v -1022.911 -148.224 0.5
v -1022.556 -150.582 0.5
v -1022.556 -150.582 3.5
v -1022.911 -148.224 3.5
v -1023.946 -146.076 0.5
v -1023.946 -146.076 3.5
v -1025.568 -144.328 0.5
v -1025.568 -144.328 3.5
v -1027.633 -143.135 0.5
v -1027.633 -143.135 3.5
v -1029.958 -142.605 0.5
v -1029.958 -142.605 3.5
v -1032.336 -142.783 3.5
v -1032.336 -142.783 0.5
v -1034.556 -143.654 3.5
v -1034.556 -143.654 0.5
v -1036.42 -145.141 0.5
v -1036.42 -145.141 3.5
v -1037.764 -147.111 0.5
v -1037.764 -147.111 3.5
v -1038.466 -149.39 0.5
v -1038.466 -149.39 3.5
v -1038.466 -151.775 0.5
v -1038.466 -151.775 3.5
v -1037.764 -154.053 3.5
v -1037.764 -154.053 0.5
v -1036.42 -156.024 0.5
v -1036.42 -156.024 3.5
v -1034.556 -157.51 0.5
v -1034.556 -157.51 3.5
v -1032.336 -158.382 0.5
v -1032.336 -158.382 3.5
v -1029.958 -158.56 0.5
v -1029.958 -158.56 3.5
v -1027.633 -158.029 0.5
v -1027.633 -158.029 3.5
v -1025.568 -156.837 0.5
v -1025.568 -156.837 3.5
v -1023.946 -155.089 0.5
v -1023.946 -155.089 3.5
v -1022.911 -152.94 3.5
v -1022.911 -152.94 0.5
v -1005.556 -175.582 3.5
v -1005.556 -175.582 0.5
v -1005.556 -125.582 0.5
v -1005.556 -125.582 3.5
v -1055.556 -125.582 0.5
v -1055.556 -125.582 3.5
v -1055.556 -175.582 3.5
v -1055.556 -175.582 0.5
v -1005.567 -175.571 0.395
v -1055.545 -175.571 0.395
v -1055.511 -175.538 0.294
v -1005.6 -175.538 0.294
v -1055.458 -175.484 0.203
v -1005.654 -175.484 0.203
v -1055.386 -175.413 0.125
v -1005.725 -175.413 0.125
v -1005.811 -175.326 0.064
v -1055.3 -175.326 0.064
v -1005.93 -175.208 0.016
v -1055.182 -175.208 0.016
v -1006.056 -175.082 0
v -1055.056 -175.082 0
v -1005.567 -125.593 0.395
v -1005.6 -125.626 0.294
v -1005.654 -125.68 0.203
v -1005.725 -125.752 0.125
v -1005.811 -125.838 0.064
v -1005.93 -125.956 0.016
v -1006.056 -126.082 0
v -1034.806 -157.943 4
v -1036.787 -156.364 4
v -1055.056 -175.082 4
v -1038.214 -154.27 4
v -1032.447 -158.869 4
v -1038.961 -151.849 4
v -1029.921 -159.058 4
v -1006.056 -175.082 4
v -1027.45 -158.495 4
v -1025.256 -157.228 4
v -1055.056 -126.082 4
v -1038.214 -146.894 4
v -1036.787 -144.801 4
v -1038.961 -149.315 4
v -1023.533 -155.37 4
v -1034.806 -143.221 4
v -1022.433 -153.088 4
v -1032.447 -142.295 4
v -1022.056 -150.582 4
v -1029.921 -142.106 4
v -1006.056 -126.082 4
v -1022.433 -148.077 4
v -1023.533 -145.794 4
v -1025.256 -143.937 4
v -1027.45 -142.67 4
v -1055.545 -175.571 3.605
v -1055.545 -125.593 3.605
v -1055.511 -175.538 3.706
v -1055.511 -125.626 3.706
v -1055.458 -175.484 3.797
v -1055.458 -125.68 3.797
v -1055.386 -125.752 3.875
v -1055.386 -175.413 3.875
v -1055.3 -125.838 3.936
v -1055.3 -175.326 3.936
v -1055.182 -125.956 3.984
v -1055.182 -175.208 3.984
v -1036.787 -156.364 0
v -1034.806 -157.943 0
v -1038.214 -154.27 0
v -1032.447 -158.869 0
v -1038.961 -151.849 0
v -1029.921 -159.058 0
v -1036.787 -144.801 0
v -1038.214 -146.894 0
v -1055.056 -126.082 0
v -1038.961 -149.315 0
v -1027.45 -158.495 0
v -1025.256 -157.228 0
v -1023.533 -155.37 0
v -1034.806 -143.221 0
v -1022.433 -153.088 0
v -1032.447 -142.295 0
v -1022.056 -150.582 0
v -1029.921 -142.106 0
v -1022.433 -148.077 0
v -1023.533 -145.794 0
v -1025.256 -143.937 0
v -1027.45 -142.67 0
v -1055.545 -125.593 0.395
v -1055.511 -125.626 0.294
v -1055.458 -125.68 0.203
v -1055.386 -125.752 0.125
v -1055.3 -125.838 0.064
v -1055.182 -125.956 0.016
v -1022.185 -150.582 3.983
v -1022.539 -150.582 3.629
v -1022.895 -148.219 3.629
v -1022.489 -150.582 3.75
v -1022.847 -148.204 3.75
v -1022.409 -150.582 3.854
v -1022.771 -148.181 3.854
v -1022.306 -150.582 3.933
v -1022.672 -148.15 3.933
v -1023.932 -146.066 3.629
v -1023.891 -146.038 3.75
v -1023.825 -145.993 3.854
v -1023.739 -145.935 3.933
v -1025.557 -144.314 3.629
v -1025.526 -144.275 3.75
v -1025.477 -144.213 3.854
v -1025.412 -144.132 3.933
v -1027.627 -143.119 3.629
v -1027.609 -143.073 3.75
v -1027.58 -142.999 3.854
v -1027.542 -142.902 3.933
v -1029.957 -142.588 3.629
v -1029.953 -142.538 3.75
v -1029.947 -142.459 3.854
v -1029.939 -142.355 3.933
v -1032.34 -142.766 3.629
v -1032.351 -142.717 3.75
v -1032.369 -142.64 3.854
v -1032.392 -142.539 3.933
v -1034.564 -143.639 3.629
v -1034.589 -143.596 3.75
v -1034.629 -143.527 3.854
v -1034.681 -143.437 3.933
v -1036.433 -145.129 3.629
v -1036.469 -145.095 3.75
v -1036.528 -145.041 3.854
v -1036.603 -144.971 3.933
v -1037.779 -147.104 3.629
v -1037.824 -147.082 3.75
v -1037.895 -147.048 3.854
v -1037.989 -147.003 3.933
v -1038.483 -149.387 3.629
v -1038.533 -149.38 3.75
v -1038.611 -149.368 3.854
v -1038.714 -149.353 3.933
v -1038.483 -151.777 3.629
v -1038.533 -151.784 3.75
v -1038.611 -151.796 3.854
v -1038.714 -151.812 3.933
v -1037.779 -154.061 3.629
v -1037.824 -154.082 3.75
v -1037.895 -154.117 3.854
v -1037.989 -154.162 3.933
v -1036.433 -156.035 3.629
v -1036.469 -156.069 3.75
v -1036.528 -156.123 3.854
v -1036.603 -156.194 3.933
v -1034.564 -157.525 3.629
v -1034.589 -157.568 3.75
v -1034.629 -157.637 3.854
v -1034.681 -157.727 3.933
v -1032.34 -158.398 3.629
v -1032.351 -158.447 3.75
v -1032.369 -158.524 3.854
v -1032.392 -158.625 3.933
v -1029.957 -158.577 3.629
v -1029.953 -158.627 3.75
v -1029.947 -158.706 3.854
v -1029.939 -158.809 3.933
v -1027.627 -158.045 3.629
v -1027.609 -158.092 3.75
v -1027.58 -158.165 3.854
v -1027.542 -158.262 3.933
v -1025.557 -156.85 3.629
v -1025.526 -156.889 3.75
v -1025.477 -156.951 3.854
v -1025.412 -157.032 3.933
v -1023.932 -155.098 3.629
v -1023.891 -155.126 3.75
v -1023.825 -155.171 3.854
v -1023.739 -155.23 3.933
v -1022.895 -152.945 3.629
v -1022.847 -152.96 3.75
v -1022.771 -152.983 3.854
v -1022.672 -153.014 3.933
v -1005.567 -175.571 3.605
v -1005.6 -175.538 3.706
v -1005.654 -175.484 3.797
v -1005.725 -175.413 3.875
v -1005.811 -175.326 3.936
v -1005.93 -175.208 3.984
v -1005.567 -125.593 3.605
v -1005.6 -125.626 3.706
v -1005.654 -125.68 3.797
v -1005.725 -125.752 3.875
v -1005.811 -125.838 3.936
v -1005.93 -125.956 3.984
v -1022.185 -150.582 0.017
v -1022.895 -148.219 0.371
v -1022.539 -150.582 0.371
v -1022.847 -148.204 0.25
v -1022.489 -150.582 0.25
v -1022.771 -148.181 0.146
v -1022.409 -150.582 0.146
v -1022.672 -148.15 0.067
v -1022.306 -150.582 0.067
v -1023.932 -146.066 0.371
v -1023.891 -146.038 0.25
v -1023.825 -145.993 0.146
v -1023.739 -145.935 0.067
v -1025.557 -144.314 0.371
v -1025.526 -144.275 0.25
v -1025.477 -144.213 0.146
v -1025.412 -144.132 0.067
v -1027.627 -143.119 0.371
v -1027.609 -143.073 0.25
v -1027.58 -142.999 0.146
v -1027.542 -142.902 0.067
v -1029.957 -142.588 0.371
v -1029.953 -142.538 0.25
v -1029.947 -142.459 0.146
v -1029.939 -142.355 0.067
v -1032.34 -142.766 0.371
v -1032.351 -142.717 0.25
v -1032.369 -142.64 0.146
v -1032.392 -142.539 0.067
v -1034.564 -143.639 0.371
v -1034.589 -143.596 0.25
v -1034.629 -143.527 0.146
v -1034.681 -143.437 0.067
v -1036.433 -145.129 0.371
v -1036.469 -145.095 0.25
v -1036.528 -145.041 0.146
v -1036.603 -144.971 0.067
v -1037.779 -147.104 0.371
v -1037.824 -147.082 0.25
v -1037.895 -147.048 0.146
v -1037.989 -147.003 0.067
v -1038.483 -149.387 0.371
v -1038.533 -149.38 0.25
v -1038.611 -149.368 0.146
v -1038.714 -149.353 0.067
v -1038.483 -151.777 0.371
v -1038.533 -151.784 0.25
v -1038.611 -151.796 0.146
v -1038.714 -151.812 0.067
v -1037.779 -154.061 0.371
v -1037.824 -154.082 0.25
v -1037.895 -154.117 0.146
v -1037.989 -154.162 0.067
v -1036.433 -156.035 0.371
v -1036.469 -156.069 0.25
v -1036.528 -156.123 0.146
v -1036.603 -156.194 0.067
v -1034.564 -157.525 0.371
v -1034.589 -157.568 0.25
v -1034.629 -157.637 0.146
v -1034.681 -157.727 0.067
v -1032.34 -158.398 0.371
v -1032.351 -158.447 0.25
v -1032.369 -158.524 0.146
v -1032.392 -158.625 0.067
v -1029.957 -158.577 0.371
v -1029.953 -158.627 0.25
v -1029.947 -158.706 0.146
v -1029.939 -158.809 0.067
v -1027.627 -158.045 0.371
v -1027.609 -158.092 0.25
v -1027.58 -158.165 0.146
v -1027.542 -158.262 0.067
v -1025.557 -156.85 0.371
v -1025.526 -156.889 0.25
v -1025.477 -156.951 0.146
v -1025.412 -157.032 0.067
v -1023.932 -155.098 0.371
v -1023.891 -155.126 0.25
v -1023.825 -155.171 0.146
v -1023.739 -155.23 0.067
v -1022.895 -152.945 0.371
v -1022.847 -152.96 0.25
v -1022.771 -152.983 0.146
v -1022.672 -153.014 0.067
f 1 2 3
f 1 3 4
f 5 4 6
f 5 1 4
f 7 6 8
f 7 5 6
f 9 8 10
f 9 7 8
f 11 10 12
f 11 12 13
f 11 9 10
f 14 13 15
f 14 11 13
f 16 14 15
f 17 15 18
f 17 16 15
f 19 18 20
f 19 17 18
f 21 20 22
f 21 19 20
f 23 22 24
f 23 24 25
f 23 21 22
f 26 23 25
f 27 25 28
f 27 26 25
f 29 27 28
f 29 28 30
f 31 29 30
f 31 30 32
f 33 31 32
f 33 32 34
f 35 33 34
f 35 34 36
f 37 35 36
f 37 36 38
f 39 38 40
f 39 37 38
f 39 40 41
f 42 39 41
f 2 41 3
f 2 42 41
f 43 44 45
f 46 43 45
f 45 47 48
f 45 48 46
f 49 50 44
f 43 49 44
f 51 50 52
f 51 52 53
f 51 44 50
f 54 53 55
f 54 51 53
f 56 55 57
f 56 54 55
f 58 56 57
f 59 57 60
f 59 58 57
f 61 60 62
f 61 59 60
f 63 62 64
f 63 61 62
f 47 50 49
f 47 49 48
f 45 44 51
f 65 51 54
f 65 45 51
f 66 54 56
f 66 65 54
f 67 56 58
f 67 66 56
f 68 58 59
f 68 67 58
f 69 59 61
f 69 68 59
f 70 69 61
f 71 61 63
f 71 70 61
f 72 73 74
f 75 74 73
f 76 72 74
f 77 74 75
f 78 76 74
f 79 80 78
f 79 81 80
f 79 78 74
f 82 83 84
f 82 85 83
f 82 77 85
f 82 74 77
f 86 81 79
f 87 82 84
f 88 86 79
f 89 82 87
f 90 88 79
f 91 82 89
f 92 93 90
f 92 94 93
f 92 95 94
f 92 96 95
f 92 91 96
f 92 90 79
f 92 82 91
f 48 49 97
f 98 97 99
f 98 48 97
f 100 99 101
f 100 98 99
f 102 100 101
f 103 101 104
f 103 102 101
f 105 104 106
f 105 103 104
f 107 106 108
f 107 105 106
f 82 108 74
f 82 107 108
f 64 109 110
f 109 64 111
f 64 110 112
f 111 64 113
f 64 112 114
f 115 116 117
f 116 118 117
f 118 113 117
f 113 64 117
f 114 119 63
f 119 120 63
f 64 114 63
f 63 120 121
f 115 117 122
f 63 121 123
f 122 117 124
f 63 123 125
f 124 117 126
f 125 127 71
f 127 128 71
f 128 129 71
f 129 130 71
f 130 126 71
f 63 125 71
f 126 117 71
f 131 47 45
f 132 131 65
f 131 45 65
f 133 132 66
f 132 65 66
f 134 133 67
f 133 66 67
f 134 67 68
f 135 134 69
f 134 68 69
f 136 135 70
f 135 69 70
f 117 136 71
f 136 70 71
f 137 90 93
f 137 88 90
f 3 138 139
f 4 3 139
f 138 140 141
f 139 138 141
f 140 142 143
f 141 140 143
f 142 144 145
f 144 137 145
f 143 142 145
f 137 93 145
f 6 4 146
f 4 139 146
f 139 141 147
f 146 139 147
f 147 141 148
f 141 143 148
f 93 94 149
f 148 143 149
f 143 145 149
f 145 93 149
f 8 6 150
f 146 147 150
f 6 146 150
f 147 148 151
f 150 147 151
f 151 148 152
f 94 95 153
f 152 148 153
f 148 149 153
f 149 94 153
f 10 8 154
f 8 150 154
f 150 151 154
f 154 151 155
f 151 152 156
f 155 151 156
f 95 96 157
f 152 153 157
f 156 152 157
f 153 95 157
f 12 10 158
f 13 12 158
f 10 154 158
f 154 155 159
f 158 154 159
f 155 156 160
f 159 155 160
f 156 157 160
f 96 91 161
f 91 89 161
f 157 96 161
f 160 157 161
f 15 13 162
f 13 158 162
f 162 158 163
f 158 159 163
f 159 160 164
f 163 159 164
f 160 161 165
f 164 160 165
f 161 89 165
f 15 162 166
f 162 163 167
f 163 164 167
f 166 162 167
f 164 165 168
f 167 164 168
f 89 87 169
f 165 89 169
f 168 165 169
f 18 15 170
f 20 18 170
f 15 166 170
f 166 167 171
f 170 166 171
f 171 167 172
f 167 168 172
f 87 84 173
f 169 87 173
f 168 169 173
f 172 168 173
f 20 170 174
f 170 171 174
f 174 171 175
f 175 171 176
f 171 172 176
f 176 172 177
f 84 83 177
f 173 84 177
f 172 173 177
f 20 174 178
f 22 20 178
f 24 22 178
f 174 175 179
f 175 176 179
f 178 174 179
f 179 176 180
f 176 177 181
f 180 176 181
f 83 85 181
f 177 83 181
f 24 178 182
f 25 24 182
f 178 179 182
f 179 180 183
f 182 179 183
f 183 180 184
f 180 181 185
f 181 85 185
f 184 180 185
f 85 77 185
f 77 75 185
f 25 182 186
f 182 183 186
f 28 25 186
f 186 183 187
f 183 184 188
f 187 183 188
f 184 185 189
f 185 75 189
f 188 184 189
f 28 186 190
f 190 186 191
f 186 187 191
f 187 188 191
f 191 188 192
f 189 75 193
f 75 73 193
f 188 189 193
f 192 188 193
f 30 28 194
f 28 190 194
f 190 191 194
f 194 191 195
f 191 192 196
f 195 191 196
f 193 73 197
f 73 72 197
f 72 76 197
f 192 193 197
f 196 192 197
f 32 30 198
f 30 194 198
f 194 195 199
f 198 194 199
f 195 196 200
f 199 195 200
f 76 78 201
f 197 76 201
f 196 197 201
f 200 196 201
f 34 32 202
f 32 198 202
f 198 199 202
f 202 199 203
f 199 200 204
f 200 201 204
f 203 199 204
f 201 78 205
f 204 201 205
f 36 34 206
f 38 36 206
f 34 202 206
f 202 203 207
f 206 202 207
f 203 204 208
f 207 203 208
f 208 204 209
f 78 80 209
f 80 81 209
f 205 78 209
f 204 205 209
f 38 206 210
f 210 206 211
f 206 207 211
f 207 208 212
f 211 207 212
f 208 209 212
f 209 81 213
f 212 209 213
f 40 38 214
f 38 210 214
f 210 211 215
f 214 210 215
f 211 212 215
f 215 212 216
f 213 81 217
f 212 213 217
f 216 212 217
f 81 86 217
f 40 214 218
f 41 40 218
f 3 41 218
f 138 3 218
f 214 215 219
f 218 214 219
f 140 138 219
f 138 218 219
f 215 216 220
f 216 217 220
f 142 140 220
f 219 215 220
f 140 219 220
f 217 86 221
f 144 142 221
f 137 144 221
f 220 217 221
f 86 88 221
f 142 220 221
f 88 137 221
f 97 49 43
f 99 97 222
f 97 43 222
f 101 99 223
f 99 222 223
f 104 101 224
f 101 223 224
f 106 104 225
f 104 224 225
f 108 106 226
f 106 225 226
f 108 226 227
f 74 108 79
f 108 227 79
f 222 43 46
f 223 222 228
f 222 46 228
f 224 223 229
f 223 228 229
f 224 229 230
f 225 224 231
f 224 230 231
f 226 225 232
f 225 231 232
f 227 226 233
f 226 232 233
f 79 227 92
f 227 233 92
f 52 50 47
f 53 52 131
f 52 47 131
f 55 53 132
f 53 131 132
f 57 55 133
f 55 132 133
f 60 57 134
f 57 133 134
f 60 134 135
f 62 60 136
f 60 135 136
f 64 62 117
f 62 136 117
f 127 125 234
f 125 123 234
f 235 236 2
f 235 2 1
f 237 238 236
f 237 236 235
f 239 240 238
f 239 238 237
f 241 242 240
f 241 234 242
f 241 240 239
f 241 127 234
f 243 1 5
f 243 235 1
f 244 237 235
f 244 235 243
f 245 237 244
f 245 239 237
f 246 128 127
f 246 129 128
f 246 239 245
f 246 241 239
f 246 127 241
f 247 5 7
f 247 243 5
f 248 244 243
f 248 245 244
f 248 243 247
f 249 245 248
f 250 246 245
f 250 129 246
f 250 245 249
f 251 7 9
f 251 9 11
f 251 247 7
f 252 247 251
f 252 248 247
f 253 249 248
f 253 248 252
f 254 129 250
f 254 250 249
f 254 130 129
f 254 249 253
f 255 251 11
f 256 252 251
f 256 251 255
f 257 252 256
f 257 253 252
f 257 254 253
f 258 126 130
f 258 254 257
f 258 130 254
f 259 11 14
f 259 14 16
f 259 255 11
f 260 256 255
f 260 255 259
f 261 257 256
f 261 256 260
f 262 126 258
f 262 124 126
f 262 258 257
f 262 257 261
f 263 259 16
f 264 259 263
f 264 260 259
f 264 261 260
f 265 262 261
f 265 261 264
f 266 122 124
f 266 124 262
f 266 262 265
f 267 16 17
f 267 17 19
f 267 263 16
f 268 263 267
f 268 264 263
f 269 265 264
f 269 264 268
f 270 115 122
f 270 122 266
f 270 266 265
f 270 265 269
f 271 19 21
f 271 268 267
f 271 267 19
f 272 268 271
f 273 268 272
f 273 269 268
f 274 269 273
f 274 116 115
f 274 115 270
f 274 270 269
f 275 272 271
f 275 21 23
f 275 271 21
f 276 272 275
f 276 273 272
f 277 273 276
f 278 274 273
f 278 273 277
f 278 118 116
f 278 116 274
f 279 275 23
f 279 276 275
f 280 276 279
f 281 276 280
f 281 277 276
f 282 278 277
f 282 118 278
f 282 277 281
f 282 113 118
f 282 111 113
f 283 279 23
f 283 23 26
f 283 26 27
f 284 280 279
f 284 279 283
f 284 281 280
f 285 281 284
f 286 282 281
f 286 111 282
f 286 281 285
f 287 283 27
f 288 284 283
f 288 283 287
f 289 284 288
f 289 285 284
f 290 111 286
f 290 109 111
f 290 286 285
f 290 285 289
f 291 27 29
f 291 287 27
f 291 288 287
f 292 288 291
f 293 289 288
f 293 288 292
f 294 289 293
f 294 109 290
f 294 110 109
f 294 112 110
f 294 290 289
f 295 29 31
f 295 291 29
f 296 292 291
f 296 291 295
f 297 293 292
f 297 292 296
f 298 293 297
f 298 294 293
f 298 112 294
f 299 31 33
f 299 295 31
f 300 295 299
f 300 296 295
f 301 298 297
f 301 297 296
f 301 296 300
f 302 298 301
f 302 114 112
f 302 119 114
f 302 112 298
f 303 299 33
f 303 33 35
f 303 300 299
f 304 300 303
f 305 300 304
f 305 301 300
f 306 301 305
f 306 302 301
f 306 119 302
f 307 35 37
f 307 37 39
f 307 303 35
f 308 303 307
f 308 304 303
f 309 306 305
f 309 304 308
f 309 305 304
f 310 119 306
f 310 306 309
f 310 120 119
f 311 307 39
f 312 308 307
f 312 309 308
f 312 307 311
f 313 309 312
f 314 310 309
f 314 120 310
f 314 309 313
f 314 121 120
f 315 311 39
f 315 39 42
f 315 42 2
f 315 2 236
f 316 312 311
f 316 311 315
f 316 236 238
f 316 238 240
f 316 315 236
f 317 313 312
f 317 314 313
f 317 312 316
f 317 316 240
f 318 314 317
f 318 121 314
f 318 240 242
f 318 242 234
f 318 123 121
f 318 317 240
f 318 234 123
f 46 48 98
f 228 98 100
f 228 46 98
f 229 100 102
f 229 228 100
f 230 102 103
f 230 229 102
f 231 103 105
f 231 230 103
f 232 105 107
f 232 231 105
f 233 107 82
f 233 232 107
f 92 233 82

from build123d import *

# Parameters (mm, degrees)
SZKIC1_W                    = 50
SZKIC1_H                    = 50
SZKIC1_R                    = 8
DODANIE_WYCI_GNI_CIE1_DEPTH = 4
ZAOKR_GLENIE1_R             = 0.5


with BuildPart() as part:
    # Szkic1 → Dodanie-wyciągnięcie1 (new body)
    with BuildSketch(Plane.XY):
        with Locations((-1030.555795761, -150.582176964)):
            Rectangle(SZKIC1_W, SZKIC1_H)
        with Locations((-1030.555795761, -150.582176964)):
            Circle(SZKIC1_R, mode=Mode.SUBTRACT)
    extrude(amount=DODANIE_WYCI_GNI_CIE1_DEPTH)

    # Zaokrąglenie1
    zaokr_glenie1_edges = [part.edges().sort_by_distance(p)[0] for p in [
        (-1005.555795761, -150.582176964, 4),
        (-1030.555795761, -125.582176964, 4),
        (-1055.555795761, -150.582176964, 4),
        (-1030.555795761, -175.582176964, 4),
        (-1038.555795761, -150.582176964, 4),
        (-1030.555795761, -175.582176964, 0),
        (-1055.555795761, -150.582176964, 0),
        (-1030.555795761, -125.582176964, 0),
        (-1005.555795761, -150.582176964, 0),
        (-1038.555795761, -150.582176964, 0),
    ]]
    fillet(zaokr_glenie1_edges, radius=ZAOKR_GLENIE1_R)


solid = part.part
